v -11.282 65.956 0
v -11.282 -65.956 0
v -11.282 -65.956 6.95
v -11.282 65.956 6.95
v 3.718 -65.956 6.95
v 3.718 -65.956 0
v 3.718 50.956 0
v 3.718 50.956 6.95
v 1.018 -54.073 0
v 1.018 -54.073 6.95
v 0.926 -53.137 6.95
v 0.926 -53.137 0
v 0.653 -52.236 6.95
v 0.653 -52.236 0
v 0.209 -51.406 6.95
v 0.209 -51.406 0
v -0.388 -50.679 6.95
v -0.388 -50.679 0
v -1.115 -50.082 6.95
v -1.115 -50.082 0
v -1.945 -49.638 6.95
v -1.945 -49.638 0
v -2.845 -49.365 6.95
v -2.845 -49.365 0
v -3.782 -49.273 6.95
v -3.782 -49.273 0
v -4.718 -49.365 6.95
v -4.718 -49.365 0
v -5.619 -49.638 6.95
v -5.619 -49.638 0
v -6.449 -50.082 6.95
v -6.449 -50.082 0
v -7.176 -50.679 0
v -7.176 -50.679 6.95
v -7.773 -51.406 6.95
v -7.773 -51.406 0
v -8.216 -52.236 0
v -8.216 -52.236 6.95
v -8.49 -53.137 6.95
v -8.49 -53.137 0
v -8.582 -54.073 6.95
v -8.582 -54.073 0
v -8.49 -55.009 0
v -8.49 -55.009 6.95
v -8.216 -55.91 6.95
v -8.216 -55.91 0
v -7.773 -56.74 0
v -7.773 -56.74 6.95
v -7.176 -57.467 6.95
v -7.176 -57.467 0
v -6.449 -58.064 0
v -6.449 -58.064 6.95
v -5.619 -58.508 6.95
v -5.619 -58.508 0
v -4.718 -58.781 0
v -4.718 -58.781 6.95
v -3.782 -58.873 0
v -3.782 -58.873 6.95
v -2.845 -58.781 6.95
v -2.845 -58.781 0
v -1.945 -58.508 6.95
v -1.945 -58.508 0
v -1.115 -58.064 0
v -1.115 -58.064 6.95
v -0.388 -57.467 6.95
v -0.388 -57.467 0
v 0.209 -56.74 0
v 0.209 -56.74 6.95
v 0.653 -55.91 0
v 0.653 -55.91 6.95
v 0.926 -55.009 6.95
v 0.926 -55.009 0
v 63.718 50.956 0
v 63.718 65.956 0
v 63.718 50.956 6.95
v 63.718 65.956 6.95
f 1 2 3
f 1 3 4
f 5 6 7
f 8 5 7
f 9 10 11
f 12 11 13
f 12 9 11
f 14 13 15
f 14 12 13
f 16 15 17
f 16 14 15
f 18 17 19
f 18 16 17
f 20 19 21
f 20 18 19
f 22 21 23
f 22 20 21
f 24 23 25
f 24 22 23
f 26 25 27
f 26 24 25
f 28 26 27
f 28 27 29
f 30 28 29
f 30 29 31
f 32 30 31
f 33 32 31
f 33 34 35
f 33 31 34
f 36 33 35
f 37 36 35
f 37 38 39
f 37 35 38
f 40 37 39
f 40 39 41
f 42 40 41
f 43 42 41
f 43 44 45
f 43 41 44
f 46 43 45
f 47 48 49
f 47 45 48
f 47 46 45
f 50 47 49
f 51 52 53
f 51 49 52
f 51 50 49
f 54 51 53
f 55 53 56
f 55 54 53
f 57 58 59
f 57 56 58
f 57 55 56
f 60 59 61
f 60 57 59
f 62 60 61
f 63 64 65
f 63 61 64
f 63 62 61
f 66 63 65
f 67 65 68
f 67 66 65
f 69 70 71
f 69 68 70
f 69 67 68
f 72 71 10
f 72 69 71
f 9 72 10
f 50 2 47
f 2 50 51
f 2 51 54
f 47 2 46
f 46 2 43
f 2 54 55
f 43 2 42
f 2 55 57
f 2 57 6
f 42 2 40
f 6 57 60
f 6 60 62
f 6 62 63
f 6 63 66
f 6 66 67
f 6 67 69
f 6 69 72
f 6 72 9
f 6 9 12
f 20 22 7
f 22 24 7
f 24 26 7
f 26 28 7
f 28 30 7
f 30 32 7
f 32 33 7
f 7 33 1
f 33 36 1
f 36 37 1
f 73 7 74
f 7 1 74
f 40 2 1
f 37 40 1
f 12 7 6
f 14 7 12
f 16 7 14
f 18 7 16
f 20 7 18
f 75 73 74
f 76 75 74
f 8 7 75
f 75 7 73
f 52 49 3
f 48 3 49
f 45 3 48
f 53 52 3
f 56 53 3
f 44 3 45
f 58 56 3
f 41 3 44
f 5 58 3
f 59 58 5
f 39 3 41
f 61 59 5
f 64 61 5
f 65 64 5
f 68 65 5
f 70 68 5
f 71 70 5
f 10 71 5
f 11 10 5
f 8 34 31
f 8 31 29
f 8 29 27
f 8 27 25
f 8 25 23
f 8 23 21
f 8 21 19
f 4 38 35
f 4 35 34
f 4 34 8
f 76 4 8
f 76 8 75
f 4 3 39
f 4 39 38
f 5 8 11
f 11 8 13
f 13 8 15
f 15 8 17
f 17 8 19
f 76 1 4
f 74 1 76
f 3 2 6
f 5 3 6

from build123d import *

# Parameters (mm, degrees)
SKETCH_3_W          = 15
SKETCH_3_H          = 131.91272758
EXTRUDE_2_DEPTH     = 6.95
SKETCH_4_W          = 60
SKETCH_4_H          = 15
EXTRUDE_3_DEPTH     = 6.95
SKETCH_5_R          = 4.8
CUT_EXTRUDE_5_DEPTH = 7.95


with BuildPart() as part:
    # 草图3 → 凸台-拉伸2 (new body)
    with BuildSketch(Plane.XY):
        with Locations((-3.781807483, 0)):
            Rectangle(SKETCH_3_W, SKETCH_3_H)
    extrude(amount=EXTRUDE_2_DEPTH)

    # 草图4 → 凸台-拉伸3 (add)
    with BuildSketch(Plane.XY):
        with Locations((33.718192517, 58.45636379)):
            Rectangle(SKETCH_4_W, SKETCH_4_H)
    extrude(amount=EXTRUDE_3_DEPTH)

    # 草图5 → 切除-拉伸5 (cut, through all)
    with BuildSketch(Plane.XY):
        with Locations((-3.781807483, -54.073012812)):
            Circle(SKETCH_5_R)
    extrude(amount=CUT_EXTRUDE_5_DEPTH, mode=Mode.SUBTRACT)


solid = part.part
